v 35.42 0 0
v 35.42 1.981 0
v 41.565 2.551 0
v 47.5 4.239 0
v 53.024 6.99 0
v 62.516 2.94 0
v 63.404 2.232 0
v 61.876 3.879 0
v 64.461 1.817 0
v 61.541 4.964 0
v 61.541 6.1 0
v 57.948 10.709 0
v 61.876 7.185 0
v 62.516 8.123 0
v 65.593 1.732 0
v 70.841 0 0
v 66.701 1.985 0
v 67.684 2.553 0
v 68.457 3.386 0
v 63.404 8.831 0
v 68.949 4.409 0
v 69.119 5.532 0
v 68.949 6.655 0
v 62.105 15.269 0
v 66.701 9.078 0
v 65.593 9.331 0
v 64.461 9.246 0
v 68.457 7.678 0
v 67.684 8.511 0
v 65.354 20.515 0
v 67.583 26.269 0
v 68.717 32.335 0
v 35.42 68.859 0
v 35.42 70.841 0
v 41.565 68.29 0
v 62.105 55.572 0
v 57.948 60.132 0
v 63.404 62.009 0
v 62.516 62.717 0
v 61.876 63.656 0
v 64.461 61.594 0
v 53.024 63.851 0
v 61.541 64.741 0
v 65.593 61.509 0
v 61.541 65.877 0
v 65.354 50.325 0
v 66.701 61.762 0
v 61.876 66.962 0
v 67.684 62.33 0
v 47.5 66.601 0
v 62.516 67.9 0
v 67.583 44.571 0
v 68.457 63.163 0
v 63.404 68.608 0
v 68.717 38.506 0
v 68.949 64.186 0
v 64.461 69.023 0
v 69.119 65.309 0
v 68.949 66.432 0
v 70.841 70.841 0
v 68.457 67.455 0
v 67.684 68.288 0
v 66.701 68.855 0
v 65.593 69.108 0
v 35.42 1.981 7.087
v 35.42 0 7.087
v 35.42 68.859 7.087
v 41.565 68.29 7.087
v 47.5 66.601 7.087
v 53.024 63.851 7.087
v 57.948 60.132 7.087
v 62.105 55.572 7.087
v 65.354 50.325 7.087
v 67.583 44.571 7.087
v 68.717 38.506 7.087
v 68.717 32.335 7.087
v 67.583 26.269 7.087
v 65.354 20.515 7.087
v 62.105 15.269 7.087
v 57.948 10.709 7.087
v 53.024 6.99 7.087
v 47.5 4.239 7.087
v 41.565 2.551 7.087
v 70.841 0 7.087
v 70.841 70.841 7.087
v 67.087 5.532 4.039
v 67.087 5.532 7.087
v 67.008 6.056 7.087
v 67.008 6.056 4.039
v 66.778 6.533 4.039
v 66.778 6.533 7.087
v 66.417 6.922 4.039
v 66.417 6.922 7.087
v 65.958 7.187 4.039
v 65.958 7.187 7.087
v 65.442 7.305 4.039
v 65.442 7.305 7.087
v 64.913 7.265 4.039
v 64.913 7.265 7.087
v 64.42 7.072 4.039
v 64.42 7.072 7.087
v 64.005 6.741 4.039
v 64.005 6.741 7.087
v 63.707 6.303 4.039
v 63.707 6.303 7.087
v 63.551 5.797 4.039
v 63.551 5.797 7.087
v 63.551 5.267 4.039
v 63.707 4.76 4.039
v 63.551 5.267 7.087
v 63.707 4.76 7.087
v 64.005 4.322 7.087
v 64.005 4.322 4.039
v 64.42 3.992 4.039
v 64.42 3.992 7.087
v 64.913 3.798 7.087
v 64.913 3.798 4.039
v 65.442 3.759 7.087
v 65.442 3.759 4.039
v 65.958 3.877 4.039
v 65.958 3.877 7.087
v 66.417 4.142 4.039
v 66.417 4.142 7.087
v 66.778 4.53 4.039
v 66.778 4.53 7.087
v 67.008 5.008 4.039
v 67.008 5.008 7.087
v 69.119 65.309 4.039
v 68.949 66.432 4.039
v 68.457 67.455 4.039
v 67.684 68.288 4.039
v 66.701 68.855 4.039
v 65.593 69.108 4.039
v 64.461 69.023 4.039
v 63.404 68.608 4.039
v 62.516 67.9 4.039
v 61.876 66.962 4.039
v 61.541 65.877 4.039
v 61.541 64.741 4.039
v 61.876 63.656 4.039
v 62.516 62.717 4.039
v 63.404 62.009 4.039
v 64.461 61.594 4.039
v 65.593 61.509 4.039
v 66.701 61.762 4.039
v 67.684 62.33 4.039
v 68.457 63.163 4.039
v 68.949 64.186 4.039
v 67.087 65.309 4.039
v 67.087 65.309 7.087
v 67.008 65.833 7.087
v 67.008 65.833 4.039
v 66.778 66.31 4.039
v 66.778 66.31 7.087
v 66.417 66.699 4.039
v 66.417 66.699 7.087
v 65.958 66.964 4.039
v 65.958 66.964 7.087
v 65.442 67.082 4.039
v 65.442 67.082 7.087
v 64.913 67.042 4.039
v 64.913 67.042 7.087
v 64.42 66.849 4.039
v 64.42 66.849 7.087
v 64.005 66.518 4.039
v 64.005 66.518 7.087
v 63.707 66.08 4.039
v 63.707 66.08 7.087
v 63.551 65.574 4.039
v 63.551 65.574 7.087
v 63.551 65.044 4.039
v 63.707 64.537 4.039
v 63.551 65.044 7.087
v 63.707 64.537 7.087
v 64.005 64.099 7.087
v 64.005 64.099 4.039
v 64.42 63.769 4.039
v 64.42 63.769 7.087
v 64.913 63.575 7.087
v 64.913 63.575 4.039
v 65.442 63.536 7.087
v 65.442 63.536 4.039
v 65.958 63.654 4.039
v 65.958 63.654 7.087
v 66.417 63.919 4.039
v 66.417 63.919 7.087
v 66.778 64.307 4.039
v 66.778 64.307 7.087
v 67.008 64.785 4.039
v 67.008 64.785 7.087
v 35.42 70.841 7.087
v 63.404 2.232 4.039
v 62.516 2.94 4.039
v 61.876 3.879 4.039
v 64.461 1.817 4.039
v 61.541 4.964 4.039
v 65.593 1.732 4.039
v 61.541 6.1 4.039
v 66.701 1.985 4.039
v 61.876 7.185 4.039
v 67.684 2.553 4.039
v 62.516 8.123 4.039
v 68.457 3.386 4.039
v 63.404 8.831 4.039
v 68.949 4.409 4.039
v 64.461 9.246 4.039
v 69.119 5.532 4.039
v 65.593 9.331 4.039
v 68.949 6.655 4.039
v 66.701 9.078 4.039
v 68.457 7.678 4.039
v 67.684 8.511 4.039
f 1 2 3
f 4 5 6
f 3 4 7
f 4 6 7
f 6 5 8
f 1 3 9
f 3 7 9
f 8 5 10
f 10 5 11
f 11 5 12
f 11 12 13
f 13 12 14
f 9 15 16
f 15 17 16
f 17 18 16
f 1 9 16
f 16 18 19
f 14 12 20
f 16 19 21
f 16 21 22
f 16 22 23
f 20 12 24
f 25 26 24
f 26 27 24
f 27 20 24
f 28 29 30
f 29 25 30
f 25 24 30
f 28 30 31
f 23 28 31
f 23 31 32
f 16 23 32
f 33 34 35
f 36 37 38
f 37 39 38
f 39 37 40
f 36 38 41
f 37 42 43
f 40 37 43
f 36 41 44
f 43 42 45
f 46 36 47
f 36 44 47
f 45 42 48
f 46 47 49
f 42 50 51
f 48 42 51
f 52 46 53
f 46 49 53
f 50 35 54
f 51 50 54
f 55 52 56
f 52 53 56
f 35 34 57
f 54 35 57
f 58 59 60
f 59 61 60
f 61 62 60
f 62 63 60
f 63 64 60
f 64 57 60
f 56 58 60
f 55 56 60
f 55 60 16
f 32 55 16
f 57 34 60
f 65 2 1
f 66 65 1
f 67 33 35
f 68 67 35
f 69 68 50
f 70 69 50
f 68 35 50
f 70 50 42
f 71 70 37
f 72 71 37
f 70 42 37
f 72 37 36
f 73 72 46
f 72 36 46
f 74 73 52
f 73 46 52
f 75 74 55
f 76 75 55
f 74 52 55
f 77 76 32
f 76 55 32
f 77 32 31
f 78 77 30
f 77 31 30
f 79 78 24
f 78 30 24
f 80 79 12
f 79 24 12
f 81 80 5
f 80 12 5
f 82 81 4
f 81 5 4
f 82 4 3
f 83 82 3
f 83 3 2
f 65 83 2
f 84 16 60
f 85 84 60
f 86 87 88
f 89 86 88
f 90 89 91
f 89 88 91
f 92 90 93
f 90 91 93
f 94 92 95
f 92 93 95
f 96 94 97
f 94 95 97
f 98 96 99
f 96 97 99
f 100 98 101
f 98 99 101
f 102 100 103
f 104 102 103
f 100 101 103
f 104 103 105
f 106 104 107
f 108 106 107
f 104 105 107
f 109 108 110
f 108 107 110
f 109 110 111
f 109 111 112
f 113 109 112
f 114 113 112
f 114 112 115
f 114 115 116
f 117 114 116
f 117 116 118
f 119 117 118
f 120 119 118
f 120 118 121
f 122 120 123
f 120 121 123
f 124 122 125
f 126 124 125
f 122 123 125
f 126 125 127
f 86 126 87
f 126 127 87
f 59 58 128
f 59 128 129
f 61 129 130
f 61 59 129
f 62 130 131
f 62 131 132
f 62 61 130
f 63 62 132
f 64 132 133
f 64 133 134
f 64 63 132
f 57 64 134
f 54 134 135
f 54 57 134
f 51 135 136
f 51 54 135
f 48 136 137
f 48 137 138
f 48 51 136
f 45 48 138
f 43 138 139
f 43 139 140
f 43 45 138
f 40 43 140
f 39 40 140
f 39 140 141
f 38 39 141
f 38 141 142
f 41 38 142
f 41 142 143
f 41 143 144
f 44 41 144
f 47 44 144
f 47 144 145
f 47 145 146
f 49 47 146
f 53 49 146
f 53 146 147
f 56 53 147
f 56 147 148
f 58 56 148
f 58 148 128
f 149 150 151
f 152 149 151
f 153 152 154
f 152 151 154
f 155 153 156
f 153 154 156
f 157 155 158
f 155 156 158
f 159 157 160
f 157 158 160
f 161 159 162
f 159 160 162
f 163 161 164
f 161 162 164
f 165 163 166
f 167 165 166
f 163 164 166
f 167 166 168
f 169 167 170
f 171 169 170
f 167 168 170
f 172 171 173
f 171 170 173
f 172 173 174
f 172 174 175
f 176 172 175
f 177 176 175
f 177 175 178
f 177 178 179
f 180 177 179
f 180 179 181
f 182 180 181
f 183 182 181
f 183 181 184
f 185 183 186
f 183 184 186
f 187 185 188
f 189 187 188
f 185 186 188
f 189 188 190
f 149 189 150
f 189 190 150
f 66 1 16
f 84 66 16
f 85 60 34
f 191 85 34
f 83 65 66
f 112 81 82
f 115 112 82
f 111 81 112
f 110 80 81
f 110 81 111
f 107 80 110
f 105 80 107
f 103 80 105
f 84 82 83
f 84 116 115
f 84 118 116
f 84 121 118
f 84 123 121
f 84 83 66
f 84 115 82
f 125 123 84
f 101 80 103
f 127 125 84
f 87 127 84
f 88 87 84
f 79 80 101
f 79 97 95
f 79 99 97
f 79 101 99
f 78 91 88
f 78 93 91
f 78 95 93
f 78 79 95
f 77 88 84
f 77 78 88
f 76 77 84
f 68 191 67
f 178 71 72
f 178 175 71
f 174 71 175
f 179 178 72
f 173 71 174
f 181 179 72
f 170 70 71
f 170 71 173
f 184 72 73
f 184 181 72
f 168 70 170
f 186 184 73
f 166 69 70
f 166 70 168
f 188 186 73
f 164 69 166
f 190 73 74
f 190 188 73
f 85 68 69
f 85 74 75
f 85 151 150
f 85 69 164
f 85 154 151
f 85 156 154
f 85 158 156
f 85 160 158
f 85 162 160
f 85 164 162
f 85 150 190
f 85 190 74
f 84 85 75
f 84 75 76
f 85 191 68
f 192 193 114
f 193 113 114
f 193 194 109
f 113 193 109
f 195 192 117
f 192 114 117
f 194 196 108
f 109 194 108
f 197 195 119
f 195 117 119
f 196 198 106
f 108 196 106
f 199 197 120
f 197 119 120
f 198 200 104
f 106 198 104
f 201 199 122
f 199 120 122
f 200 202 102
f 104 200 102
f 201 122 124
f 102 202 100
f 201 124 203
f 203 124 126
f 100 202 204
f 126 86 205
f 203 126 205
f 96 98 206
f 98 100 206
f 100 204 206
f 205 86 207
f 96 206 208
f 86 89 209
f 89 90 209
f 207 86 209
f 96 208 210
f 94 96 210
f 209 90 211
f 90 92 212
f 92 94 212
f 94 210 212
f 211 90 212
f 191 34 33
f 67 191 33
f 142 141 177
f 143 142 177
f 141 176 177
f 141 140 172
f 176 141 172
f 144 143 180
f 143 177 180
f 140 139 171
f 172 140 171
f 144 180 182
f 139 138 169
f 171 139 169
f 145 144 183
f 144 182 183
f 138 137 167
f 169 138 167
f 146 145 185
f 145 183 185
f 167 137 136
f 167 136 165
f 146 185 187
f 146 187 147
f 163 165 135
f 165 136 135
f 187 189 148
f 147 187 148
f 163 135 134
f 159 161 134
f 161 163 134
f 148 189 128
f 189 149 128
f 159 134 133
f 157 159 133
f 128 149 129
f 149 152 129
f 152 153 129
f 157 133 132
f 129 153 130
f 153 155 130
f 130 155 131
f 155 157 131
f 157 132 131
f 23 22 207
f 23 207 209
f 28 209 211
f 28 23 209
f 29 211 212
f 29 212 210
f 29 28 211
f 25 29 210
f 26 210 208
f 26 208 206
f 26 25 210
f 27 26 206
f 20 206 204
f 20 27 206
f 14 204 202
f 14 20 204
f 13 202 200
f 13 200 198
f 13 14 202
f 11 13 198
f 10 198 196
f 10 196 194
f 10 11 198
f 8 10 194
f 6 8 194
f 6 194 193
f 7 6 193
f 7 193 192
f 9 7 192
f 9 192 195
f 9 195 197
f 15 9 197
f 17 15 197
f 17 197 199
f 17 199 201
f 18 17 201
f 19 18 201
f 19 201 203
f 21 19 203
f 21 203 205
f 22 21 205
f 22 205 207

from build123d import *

# Parameters (mm, degrees)
F0_R     = 3.81
F1_DEPTH = 7.0866
F2_R     = 1.778
F2_R_2   = 3.81
F3_DEPTH = 3.048
F4_DEPTH = 25.4


with BuildPart() as f1:
    # F0 (on Top) → F1 (new body)
    with BuildSketch(Plane.XY):
        with BuildLine():
            Line((35.4203, 1.9812), (35.4203, 0))
            Line((35.4203, 0), (70.8406, 0))
            Line((70.8406, 0), (70.8406, 70.8406))
            Line((70.8406, 70.8406), (35.4203, 70.8406))
            Line((35.4203, 70.8406), (35.4203, 68.8594))
            ThreePointArc((35.4203, 68.8594), (68.8594, 35.4203), (35.4203, 1.9812))
        make_face()
        with Locations((65.308762, 5.531838)):
            Circle(F0_R, mode=Mode.SUBTRACT)
        with Locations((65.308762, 65.308762)):
            Circle(F0_R, mode=Mode.SUBTRACT)
    extrude(amount=F1_DEPTH)

    # F2 (on face) → F3 (join)
    with BuildSketch(Plane.XY.offset(7.0866)):
        with Locations((65.308762, 5.531838)):
            Circle(F2_R)
        with Locations((65.308762, 65.308762)):
            Circle(F2_R)
        with Locations((65.308762, 65.308762)):
            Circle(F2_R_2)
        with Locations((65.308762, 65.308762)):
            Circle(F2_R, mode=Mode.SUBTRACT)
        with Locations((65.308762, 5.531838)):
            Circle(F2_R_2)
        with Locations((65.308762, 5.531838)):
            Circle(F2_R, mode=Mode.SUBTRACT)
    extrude(amount=-F3_DEPTH)

    # F2 (on face) → F4 (cut)
    with BuildSketch(Plane.XY.offset(7.0866)):
        with Locations((65.308762, 5.531838)):
            Circle(F2_R)
        with Locations((65.308762, 65.308762)):
            Circle(F2_R)
    extrude(amount=-F4_DEPTH, mode=Mode.SUBTRACT)


solid = f1.part
